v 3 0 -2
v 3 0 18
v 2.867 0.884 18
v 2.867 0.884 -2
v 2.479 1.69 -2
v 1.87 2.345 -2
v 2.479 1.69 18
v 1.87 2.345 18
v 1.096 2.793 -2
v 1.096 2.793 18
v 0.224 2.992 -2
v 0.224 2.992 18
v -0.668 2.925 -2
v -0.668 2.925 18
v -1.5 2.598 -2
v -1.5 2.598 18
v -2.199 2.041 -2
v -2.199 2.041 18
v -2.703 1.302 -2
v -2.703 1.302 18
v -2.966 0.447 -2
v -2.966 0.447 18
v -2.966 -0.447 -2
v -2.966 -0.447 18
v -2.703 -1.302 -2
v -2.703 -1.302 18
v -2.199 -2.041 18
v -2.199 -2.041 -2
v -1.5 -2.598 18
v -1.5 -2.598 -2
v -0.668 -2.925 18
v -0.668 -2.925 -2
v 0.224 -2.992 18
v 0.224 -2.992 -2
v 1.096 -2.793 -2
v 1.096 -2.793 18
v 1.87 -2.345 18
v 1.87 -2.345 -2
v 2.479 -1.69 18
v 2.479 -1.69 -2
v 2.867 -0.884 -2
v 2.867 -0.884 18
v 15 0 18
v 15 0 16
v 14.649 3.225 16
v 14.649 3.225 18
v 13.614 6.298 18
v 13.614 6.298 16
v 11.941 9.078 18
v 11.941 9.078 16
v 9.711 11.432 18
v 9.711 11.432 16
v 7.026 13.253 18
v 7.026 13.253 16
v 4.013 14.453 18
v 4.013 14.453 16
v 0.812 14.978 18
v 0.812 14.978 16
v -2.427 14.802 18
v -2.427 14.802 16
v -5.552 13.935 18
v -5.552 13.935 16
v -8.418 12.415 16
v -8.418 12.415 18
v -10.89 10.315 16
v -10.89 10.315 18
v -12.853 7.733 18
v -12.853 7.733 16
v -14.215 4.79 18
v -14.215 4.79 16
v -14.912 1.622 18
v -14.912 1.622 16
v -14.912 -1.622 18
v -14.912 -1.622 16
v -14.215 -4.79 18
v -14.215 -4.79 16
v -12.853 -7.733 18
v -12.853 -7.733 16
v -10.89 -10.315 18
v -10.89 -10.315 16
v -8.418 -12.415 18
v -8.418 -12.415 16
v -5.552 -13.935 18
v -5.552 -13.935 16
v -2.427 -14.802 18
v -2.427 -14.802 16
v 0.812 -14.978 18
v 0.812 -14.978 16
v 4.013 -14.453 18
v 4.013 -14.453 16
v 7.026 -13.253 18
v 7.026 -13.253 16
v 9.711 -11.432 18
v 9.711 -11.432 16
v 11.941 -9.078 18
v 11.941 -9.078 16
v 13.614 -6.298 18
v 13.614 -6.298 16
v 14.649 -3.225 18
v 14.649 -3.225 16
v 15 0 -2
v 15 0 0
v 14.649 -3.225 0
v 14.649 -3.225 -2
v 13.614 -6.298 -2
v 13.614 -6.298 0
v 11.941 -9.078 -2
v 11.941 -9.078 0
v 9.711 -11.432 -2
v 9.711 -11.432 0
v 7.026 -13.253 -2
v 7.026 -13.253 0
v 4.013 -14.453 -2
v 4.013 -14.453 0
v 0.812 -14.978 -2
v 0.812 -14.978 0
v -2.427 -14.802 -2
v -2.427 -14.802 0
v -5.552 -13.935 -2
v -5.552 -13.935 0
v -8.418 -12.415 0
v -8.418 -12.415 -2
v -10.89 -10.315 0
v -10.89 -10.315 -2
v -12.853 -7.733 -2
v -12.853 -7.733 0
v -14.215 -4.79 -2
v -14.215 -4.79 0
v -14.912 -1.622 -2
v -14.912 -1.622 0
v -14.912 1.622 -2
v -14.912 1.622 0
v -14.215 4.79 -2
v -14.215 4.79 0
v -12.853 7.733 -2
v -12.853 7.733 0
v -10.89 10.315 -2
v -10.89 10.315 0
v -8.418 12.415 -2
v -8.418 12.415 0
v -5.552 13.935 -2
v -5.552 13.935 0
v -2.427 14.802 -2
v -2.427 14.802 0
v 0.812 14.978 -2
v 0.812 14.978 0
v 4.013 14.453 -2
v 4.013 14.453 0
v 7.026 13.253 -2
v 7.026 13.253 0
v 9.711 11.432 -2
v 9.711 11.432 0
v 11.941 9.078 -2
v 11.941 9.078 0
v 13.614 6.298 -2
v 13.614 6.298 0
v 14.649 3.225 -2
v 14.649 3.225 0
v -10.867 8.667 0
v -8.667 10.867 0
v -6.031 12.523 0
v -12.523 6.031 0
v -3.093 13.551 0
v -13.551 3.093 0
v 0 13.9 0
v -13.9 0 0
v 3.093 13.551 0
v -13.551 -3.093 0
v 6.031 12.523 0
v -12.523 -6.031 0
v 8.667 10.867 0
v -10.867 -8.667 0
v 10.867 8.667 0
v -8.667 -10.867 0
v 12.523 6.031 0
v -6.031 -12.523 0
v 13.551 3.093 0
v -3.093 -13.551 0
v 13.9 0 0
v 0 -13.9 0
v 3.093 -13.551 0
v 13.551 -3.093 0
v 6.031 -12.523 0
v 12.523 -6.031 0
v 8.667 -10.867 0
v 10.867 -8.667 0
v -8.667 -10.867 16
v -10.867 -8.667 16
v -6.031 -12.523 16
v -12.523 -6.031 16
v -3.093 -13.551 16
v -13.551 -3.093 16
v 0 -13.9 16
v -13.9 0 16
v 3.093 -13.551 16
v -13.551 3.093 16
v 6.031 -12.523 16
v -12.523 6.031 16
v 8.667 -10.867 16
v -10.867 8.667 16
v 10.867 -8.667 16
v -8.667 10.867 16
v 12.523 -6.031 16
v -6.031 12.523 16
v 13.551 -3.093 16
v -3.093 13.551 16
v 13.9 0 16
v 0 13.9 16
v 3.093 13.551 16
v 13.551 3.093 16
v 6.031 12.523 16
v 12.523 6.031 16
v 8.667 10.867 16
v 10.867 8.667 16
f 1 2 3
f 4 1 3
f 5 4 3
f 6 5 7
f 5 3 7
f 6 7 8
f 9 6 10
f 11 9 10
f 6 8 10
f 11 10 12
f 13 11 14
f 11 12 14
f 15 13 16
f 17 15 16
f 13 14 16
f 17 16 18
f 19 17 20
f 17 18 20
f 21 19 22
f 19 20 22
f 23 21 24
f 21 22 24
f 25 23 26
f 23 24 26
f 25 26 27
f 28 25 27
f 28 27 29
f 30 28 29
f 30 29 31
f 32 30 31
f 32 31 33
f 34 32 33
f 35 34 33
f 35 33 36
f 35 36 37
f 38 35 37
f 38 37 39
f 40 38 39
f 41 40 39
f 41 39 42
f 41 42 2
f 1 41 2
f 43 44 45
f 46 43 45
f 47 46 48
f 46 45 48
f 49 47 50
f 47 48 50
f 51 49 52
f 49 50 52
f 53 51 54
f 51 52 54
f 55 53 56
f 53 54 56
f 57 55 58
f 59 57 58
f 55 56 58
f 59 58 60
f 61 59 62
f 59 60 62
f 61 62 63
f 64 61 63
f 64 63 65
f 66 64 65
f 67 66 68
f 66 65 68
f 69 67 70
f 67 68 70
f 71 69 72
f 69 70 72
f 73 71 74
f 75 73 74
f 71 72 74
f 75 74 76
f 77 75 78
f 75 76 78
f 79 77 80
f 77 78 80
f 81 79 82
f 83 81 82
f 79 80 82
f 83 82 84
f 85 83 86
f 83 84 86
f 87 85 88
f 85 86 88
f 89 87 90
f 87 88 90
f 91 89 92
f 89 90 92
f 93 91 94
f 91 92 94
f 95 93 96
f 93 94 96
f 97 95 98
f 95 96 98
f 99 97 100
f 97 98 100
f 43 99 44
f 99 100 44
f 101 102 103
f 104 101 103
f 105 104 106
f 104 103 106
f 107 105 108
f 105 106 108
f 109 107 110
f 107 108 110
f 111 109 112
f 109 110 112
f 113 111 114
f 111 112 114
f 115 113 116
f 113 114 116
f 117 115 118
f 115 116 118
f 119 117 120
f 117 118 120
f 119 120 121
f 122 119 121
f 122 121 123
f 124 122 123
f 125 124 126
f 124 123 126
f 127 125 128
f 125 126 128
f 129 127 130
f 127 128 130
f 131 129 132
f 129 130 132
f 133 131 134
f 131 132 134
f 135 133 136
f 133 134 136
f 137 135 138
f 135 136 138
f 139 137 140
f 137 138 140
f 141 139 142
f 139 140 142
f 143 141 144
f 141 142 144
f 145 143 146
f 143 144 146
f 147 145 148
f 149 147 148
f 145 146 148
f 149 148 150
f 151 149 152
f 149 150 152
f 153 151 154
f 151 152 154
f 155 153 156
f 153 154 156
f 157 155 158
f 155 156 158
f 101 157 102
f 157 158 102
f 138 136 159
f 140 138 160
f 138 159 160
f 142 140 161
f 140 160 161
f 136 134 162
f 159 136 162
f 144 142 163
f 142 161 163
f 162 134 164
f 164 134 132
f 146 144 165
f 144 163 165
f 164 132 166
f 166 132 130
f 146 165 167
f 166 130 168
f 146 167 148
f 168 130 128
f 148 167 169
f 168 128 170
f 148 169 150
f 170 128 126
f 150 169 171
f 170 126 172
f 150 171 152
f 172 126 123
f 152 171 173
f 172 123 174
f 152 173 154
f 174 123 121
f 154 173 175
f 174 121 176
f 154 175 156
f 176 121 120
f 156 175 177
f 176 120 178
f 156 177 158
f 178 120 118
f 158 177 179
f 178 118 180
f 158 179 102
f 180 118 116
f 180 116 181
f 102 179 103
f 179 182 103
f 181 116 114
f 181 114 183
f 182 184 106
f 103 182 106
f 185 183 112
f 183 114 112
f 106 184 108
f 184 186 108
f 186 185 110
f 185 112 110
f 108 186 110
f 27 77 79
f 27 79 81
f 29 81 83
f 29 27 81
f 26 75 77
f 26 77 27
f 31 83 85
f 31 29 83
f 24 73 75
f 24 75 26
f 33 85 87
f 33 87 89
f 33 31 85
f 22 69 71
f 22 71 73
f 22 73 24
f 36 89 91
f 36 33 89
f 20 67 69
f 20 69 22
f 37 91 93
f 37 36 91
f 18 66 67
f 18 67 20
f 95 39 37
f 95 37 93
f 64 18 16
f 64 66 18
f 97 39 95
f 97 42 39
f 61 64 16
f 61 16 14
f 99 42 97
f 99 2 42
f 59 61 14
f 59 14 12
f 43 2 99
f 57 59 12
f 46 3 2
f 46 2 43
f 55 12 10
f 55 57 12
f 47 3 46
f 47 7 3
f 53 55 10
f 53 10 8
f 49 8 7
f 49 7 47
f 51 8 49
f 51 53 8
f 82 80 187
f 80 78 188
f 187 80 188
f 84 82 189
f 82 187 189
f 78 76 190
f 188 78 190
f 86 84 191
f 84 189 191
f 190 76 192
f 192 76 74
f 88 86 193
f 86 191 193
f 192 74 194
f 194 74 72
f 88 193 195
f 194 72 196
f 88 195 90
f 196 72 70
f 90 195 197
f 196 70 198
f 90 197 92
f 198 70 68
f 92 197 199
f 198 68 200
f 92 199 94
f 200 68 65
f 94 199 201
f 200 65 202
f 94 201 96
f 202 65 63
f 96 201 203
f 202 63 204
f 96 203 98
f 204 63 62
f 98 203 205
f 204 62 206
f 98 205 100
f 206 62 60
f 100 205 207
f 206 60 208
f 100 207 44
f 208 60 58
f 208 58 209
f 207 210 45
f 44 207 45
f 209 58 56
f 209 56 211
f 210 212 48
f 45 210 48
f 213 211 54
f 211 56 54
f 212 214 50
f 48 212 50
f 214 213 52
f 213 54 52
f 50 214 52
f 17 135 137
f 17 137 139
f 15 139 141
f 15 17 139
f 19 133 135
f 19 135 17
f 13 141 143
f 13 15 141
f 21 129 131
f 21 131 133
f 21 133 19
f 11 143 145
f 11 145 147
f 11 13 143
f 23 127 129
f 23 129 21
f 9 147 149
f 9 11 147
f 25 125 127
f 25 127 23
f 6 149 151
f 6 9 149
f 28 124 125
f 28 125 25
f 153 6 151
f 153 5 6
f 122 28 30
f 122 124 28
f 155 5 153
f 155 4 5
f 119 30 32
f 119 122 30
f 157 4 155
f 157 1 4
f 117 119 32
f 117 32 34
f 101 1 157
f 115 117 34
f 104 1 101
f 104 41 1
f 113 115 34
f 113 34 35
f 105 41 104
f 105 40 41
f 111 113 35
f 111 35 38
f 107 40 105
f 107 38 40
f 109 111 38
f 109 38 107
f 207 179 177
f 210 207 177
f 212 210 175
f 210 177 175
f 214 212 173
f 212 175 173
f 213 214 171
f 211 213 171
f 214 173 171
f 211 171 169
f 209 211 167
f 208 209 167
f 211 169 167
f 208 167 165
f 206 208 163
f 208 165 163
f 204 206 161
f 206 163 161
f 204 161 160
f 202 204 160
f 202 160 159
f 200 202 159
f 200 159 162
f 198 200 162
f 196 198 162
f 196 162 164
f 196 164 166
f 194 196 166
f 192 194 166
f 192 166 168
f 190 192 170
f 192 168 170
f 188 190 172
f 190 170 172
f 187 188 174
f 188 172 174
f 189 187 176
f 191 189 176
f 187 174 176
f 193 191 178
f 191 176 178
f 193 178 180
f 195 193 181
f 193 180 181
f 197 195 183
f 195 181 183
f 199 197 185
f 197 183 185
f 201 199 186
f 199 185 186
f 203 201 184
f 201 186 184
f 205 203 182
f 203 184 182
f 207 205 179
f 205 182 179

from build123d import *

# Parameters (mm, degrees)
F0_R     = 13.9
F1_DEPTH = 16
F2_R     = 15
F2_R_2   = 13.9
F3_DEPTH = 2
F4_R     = 15
F5_DEPTH = 2
F6_R     = 3
F7_DEPTH = 20.001


with BuildPart() as f1:
    # F0 (on Top) → F1 (new body)
    with BuildSketch(Plane.XY):
        Circle(F0_R)
    extrude(amount=F1_DEPTH)

    # F2 (on face) → F3 (join)
    with BuildSketch(Plane.XY.offset(16)):
        Circle(F2_R)
        Circle(F2_R_2, mode=Mode.SUBTRACT)
        Circle(F2_R_2)
    extrude(amount=F3_DEPTH)

    # F4 (on face) → F5 (join)
    with BuildSketch(Plane(origin=(0, 0, 0), x_dir=(1, 0, 0), z_dir=(0, 0, -1))):
        Circle(F4_R)
    extrude(amount=F5_DEPTH)

    # F6 (on face) → F7 (cut, through all)
    with BuildSketch(Plane.XY.offset(18)):
        Circle(F6_R)
    extrude(amount=-F7_DEPTH, mode=Mode.SUBTRACT)


solid = f1.part
